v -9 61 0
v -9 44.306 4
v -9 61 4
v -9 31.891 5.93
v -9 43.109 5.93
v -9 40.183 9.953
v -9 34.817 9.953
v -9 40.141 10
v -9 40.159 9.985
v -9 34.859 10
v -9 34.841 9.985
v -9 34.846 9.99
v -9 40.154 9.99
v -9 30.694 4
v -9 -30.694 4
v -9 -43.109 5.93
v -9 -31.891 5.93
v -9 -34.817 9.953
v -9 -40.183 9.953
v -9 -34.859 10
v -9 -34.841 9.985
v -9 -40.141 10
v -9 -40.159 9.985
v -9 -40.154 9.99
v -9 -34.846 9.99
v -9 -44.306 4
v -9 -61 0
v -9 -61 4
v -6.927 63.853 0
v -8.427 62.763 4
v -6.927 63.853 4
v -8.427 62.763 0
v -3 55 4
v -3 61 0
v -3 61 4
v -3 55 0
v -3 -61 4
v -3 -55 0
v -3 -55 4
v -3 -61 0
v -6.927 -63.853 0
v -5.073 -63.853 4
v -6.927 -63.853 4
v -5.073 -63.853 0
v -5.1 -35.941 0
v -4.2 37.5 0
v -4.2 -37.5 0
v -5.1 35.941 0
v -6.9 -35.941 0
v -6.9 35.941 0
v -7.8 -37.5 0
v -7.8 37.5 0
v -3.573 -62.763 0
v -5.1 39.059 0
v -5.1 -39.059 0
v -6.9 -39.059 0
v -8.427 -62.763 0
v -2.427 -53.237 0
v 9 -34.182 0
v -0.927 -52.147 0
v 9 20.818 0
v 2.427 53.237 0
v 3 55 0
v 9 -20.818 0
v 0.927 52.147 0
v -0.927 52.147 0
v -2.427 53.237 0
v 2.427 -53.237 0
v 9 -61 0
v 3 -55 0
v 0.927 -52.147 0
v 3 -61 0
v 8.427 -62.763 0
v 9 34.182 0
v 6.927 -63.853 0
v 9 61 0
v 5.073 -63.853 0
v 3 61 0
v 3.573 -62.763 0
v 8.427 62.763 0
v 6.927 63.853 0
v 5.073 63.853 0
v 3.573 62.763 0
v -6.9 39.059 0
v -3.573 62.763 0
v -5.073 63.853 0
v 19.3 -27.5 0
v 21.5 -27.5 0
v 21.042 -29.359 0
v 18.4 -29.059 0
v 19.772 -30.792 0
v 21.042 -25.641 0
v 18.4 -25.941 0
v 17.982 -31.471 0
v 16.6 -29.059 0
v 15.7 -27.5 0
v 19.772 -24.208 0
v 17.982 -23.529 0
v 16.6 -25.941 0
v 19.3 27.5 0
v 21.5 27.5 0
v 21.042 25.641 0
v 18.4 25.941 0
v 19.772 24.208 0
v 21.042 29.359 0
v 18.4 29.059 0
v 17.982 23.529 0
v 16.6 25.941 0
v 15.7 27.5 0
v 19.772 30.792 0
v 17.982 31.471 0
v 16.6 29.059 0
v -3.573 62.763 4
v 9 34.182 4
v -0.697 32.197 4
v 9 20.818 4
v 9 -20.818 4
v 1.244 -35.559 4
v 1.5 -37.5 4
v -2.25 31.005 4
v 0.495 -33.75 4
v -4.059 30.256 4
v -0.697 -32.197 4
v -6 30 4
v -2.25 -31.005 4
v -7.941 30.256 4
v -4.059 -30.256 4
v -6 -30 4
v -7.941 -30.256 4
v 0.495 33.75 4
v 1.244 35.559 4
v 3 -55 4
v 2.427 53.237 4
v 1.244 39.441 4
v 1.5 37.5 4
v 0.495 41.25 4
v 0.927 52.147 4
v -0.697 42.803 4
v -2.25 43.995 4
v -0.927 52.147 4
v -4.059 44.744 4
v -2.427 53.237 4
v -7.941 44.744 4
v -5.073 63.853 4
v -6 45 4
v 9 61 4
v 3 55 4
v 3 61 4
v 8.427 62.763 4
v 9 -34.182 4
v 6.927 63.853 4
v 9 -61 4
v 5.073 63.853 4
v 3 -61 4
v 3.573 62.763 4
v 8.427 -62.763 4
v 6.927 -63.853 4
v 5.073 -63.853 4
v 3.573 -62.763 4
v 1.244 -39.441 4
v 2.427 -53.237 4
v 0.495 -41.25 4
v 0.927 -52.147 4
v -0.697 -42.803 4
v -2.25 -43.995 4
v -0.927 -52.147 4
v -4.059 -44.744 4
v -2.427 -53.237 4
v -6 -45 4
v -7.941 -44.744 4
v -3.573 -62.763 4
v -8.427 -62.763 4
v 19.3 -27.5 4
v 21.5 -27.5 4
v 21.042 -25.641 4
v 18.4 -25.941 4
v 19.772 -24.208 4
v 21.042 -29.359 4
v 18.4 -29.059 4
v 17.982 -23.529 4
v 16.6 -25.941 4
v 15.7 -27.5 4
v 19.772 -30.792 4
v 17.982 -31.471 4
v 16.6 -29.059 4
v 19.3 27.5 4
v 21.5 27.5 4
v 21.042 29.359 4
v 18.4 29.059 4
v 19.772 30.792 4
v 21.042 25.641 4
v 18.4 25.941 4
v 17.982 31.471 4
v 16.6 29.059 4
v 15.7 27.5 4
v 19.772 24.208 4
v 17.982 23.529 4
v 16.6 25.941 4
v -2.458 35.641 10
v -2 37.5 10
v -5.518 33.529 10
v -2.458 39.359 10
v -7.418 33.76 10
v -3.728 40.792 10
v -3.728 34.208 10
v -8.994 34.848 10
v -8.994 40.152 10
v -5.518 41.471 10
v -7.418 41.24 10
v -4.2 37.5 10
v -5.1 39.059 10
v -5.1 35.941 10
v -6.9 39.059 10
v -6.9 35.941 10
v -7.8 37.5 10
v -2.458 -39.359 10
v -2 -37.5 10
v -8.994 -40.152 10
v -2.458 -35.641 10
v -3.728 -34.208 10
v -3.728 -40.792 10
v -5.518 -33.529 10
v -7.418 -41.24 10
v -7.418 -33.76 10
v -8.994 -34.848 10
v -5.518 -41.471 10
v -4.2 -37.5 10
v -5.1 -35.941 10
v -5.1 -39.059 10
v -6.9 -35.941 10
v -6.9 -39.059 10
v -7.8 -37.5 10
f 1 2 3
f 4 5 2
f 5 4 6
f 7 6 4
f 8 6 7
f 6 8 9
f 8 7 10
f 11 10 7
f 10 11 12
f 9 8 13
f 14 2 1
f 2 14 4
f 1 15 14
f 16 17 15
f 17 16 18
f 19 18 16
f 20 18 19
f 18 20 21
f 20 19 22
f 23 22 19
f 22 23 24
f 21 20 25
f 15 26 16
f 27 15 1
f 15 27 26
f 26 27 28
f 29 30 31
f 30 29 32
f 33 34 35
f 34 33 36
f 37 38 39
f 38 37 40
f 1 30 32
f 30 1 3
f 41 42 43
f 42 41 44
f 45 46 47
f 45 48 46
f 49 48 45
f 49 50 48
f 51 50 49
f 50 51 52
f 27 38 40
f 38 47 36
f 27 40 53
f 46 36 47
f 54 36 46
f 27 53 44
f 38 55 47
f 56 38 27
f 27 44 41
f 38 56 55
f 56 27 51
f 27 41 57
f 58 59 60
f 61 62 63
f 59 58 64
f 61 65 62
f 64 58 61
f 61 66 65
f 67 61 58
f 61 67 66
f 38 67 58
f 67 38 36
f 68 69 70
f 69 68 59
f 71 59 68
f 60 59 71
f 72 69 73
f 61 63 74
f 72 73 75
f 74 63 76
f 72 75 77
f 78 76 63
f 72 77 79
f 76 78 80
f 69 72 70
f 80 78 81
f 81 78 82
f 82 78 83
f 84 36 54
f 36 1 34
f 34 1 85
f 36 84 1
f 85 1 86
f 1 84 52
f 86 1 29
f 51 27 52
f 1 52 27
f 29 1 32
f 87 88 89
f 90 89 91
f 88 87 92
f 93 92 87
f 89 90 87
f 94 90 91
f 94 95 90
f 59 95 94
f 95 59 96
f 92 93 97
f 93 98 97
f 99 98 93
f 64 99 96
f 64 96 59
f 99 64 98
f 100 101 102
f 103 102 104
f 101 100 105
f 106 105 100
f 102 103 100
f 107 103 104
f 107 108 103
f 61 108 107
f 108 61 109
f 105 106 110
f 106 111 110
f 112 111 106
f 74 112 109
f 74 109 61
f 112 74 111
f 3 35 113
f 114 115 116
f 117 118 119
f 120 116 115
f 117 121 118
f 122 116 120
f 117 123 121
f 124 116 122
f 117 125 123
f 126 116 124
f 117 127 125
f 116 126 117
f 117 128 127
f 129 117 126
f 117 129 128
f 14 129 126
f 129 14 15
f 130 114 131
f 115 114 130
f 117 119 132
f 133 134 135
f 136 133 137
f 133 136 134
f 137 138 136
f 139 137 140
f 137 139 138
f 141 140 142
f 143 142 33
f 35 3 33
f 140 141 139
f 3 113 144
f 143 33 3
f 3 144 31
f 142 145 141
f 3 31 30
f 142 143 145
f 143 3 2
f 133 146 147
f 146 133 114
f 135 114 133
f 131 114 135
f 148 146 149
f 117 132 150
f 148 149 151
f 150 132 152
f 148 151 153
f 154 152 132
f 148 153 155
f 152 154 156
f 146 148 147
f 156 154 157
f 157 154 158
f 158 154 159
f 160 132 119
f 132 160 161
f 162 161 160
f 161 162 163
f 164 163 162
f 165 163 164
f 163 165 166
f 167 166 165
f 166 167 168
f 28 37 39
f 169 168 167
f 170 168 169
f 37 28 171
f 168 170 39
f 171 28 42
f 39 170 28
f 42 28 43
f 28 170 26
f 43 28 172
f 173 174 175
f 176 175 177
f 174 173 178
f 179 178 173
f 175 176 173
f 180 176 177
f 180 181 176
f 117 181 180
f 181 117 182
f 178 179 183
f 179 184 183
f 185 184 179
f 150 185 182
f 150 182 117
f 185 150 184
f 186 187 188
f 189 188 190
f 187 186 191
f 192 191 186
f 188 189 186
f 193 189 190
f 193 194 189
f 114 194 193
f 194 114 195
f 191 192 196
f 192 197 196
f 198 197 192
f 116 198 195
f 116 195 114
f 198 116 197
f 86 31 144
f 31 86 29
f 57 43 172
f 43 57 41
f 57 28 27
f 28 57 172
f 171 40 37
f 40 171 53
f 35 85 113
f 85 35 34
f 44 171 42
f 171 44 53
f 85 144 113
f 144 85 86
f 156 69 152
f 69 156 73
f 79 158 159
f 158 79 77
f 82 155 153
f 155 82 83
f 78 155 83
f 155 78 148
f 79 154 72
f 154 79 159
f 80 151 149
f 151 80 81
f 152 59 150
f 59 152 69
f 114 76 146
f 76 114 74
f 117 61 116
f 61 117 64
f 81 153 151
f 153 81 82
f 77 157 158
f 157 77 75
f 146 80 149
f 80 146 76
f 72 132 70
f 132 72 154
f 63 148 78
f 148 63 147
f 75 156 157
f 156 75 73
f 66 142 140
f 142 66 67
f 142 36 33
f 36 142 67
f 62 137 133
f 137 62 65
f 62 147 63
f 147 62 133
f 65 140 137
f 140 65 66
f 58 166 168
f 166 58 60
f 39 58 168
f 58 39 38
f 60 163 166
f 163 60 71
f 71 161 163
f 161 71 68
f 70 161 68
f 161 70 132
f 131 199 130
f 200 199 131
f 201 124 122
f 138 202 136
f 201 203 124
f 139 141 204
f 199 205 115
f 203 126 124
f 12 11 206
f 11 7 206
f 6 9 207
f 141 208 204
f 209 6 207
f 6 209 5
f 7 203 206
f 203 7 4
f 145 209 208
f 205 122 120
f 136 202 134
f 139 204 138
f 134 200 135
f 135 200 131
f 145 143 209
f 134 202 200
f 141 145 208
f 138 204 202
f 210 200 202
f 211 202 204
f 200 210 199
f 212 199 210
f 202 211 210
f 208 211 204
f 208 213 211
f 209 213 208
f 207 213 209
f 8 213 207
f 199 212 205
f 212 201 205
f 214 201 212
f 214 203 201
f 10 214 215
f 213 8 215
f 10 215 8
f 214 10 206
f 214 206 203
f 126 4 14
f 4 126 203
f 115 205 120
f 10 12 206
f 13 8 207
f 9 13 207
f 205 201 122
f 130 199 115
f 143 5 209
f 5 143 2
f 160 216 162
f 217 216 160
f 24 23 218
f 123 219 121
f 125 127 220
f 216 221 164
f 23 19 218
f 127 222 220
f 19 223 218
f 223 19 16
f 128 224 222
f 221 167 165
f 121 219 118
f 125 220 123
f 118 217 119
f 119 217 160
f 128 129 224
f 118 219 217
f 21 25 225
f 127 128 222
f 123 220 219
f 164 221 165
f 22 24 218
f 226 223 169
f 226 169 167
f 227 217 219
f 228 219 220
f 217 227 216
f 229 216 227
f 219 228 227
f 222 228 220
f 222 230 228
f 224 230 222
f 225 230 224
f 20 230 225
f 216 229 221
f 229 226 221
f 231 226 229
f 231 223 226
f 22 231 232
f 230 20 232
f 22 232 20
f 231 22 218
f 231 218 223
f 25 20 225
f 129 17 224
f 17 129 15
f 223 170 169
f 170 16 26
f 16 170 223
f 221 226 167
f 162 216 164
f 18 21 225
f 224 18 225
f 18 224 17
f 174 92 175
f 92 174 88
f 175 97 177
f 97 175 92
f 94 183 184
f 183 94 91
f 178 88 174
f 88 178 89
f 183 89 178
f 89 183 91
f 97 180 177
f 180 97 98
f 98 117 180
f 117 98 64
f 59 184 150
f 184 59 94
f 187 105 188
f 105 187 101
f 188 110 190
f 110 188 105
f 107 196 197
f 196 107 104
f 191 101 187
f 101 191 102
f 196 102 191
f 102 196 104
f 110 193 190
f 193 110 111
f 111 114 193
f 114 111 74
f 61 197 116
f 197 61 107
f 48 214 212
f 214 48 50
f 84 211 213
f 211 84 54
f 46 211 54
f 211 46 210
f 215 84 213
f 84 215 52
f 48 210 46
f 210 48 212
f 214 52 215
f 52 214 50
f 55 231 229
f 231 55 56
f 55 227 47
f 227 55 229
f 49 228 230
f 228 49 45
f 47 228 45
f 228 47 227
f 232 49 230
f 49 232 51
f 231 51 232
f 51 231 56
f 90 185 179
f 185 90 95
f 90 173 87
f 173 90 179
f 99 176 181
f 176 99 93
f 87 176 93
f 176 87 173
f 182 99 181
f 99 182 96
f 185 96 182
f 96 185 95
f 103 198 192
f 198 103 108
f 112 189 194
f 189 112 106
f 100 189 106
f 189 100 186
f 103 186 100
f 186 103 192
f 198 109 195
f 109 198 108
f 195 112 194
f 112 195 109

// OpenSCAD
d=110;
mksl=75;
mksw=135;
board2l=55;
board2w=88;

module baseplate() {
    difference() {
        union() {
            hull() {
                translate([-6,d/2+6,0]) cylinder(d=6,h=4);
                translate([-6,-d/2-6,0]) cylinder(d=6,h=4);
            }
            hull() {
                translate([6,d/2+6,0]) cylinder(d=6,h=4);
                translate([6,-d/2-6,0]) cylinder(d=6,h=4);
            }
            hull() {
                translate([0,d/2,0]) cylinder(d=6,h=4);
                translate([0,-d/2,0]) cylinder(d=6,h=4);
            }
        }

        hull() {
            translate([0,d/2,-1]) cylinder(d=6,h=6);
            translate([0,d/2+11,-1]) cylinder(d=6,h=6);
        }
        hull() {
            translate([0,-d/2,-1]) cylinder(d=6,h=6);
            translate([0,-d/2-11,-1]) cylinder(d=6,h=6);
        }
    }
}

difference() {
    union() {
        baseplate();
        intersection() {
            scale([1,1,10]) baseplate();
            
            translate([-6,mksl/2,0]) hull() {
                cylinder(d=15,h=4);
                cylinder(d=8,h=10);
            }
        }
        intersection() {
            scale([1,1,10]) baseplate();
            
            translate([-6,-mksl/2,0]) hull() {
                cylinder(d=15,h=4);
                cylinder(d=8,h=10);
            }
        }
        translate([-6,-board2l/2,0]) hull() {
            translate([6,0,0]) cylinder(d=18,h=4);
            translate([mksw/2-board2w/2,0,0]) cylinder(d=8,h=4);
        }
        translate([-6,board2l/2,0]) hull() {
            translate([6,0,0]) cylinder(d=18,h=4);
            translate([mksw/2-board2w/2,0,0]) cylinder(d=8,h=4);
        }
    }
    
    translate([-6,mksl/2,-1]) cylinder(d=3.6,h=20);
    translate([-6,-mksl/2,-1]) cylinder(d=3.6,h=20);
    
    translate([-6+mksw/2-board2w/2,-board2l/2,-1]) cylinder(d=3.6,h=20);
    translate([-6+mksw/2-board2w/2,board2l/2,-1]) cylinder(d=3.6,h=20);
}
